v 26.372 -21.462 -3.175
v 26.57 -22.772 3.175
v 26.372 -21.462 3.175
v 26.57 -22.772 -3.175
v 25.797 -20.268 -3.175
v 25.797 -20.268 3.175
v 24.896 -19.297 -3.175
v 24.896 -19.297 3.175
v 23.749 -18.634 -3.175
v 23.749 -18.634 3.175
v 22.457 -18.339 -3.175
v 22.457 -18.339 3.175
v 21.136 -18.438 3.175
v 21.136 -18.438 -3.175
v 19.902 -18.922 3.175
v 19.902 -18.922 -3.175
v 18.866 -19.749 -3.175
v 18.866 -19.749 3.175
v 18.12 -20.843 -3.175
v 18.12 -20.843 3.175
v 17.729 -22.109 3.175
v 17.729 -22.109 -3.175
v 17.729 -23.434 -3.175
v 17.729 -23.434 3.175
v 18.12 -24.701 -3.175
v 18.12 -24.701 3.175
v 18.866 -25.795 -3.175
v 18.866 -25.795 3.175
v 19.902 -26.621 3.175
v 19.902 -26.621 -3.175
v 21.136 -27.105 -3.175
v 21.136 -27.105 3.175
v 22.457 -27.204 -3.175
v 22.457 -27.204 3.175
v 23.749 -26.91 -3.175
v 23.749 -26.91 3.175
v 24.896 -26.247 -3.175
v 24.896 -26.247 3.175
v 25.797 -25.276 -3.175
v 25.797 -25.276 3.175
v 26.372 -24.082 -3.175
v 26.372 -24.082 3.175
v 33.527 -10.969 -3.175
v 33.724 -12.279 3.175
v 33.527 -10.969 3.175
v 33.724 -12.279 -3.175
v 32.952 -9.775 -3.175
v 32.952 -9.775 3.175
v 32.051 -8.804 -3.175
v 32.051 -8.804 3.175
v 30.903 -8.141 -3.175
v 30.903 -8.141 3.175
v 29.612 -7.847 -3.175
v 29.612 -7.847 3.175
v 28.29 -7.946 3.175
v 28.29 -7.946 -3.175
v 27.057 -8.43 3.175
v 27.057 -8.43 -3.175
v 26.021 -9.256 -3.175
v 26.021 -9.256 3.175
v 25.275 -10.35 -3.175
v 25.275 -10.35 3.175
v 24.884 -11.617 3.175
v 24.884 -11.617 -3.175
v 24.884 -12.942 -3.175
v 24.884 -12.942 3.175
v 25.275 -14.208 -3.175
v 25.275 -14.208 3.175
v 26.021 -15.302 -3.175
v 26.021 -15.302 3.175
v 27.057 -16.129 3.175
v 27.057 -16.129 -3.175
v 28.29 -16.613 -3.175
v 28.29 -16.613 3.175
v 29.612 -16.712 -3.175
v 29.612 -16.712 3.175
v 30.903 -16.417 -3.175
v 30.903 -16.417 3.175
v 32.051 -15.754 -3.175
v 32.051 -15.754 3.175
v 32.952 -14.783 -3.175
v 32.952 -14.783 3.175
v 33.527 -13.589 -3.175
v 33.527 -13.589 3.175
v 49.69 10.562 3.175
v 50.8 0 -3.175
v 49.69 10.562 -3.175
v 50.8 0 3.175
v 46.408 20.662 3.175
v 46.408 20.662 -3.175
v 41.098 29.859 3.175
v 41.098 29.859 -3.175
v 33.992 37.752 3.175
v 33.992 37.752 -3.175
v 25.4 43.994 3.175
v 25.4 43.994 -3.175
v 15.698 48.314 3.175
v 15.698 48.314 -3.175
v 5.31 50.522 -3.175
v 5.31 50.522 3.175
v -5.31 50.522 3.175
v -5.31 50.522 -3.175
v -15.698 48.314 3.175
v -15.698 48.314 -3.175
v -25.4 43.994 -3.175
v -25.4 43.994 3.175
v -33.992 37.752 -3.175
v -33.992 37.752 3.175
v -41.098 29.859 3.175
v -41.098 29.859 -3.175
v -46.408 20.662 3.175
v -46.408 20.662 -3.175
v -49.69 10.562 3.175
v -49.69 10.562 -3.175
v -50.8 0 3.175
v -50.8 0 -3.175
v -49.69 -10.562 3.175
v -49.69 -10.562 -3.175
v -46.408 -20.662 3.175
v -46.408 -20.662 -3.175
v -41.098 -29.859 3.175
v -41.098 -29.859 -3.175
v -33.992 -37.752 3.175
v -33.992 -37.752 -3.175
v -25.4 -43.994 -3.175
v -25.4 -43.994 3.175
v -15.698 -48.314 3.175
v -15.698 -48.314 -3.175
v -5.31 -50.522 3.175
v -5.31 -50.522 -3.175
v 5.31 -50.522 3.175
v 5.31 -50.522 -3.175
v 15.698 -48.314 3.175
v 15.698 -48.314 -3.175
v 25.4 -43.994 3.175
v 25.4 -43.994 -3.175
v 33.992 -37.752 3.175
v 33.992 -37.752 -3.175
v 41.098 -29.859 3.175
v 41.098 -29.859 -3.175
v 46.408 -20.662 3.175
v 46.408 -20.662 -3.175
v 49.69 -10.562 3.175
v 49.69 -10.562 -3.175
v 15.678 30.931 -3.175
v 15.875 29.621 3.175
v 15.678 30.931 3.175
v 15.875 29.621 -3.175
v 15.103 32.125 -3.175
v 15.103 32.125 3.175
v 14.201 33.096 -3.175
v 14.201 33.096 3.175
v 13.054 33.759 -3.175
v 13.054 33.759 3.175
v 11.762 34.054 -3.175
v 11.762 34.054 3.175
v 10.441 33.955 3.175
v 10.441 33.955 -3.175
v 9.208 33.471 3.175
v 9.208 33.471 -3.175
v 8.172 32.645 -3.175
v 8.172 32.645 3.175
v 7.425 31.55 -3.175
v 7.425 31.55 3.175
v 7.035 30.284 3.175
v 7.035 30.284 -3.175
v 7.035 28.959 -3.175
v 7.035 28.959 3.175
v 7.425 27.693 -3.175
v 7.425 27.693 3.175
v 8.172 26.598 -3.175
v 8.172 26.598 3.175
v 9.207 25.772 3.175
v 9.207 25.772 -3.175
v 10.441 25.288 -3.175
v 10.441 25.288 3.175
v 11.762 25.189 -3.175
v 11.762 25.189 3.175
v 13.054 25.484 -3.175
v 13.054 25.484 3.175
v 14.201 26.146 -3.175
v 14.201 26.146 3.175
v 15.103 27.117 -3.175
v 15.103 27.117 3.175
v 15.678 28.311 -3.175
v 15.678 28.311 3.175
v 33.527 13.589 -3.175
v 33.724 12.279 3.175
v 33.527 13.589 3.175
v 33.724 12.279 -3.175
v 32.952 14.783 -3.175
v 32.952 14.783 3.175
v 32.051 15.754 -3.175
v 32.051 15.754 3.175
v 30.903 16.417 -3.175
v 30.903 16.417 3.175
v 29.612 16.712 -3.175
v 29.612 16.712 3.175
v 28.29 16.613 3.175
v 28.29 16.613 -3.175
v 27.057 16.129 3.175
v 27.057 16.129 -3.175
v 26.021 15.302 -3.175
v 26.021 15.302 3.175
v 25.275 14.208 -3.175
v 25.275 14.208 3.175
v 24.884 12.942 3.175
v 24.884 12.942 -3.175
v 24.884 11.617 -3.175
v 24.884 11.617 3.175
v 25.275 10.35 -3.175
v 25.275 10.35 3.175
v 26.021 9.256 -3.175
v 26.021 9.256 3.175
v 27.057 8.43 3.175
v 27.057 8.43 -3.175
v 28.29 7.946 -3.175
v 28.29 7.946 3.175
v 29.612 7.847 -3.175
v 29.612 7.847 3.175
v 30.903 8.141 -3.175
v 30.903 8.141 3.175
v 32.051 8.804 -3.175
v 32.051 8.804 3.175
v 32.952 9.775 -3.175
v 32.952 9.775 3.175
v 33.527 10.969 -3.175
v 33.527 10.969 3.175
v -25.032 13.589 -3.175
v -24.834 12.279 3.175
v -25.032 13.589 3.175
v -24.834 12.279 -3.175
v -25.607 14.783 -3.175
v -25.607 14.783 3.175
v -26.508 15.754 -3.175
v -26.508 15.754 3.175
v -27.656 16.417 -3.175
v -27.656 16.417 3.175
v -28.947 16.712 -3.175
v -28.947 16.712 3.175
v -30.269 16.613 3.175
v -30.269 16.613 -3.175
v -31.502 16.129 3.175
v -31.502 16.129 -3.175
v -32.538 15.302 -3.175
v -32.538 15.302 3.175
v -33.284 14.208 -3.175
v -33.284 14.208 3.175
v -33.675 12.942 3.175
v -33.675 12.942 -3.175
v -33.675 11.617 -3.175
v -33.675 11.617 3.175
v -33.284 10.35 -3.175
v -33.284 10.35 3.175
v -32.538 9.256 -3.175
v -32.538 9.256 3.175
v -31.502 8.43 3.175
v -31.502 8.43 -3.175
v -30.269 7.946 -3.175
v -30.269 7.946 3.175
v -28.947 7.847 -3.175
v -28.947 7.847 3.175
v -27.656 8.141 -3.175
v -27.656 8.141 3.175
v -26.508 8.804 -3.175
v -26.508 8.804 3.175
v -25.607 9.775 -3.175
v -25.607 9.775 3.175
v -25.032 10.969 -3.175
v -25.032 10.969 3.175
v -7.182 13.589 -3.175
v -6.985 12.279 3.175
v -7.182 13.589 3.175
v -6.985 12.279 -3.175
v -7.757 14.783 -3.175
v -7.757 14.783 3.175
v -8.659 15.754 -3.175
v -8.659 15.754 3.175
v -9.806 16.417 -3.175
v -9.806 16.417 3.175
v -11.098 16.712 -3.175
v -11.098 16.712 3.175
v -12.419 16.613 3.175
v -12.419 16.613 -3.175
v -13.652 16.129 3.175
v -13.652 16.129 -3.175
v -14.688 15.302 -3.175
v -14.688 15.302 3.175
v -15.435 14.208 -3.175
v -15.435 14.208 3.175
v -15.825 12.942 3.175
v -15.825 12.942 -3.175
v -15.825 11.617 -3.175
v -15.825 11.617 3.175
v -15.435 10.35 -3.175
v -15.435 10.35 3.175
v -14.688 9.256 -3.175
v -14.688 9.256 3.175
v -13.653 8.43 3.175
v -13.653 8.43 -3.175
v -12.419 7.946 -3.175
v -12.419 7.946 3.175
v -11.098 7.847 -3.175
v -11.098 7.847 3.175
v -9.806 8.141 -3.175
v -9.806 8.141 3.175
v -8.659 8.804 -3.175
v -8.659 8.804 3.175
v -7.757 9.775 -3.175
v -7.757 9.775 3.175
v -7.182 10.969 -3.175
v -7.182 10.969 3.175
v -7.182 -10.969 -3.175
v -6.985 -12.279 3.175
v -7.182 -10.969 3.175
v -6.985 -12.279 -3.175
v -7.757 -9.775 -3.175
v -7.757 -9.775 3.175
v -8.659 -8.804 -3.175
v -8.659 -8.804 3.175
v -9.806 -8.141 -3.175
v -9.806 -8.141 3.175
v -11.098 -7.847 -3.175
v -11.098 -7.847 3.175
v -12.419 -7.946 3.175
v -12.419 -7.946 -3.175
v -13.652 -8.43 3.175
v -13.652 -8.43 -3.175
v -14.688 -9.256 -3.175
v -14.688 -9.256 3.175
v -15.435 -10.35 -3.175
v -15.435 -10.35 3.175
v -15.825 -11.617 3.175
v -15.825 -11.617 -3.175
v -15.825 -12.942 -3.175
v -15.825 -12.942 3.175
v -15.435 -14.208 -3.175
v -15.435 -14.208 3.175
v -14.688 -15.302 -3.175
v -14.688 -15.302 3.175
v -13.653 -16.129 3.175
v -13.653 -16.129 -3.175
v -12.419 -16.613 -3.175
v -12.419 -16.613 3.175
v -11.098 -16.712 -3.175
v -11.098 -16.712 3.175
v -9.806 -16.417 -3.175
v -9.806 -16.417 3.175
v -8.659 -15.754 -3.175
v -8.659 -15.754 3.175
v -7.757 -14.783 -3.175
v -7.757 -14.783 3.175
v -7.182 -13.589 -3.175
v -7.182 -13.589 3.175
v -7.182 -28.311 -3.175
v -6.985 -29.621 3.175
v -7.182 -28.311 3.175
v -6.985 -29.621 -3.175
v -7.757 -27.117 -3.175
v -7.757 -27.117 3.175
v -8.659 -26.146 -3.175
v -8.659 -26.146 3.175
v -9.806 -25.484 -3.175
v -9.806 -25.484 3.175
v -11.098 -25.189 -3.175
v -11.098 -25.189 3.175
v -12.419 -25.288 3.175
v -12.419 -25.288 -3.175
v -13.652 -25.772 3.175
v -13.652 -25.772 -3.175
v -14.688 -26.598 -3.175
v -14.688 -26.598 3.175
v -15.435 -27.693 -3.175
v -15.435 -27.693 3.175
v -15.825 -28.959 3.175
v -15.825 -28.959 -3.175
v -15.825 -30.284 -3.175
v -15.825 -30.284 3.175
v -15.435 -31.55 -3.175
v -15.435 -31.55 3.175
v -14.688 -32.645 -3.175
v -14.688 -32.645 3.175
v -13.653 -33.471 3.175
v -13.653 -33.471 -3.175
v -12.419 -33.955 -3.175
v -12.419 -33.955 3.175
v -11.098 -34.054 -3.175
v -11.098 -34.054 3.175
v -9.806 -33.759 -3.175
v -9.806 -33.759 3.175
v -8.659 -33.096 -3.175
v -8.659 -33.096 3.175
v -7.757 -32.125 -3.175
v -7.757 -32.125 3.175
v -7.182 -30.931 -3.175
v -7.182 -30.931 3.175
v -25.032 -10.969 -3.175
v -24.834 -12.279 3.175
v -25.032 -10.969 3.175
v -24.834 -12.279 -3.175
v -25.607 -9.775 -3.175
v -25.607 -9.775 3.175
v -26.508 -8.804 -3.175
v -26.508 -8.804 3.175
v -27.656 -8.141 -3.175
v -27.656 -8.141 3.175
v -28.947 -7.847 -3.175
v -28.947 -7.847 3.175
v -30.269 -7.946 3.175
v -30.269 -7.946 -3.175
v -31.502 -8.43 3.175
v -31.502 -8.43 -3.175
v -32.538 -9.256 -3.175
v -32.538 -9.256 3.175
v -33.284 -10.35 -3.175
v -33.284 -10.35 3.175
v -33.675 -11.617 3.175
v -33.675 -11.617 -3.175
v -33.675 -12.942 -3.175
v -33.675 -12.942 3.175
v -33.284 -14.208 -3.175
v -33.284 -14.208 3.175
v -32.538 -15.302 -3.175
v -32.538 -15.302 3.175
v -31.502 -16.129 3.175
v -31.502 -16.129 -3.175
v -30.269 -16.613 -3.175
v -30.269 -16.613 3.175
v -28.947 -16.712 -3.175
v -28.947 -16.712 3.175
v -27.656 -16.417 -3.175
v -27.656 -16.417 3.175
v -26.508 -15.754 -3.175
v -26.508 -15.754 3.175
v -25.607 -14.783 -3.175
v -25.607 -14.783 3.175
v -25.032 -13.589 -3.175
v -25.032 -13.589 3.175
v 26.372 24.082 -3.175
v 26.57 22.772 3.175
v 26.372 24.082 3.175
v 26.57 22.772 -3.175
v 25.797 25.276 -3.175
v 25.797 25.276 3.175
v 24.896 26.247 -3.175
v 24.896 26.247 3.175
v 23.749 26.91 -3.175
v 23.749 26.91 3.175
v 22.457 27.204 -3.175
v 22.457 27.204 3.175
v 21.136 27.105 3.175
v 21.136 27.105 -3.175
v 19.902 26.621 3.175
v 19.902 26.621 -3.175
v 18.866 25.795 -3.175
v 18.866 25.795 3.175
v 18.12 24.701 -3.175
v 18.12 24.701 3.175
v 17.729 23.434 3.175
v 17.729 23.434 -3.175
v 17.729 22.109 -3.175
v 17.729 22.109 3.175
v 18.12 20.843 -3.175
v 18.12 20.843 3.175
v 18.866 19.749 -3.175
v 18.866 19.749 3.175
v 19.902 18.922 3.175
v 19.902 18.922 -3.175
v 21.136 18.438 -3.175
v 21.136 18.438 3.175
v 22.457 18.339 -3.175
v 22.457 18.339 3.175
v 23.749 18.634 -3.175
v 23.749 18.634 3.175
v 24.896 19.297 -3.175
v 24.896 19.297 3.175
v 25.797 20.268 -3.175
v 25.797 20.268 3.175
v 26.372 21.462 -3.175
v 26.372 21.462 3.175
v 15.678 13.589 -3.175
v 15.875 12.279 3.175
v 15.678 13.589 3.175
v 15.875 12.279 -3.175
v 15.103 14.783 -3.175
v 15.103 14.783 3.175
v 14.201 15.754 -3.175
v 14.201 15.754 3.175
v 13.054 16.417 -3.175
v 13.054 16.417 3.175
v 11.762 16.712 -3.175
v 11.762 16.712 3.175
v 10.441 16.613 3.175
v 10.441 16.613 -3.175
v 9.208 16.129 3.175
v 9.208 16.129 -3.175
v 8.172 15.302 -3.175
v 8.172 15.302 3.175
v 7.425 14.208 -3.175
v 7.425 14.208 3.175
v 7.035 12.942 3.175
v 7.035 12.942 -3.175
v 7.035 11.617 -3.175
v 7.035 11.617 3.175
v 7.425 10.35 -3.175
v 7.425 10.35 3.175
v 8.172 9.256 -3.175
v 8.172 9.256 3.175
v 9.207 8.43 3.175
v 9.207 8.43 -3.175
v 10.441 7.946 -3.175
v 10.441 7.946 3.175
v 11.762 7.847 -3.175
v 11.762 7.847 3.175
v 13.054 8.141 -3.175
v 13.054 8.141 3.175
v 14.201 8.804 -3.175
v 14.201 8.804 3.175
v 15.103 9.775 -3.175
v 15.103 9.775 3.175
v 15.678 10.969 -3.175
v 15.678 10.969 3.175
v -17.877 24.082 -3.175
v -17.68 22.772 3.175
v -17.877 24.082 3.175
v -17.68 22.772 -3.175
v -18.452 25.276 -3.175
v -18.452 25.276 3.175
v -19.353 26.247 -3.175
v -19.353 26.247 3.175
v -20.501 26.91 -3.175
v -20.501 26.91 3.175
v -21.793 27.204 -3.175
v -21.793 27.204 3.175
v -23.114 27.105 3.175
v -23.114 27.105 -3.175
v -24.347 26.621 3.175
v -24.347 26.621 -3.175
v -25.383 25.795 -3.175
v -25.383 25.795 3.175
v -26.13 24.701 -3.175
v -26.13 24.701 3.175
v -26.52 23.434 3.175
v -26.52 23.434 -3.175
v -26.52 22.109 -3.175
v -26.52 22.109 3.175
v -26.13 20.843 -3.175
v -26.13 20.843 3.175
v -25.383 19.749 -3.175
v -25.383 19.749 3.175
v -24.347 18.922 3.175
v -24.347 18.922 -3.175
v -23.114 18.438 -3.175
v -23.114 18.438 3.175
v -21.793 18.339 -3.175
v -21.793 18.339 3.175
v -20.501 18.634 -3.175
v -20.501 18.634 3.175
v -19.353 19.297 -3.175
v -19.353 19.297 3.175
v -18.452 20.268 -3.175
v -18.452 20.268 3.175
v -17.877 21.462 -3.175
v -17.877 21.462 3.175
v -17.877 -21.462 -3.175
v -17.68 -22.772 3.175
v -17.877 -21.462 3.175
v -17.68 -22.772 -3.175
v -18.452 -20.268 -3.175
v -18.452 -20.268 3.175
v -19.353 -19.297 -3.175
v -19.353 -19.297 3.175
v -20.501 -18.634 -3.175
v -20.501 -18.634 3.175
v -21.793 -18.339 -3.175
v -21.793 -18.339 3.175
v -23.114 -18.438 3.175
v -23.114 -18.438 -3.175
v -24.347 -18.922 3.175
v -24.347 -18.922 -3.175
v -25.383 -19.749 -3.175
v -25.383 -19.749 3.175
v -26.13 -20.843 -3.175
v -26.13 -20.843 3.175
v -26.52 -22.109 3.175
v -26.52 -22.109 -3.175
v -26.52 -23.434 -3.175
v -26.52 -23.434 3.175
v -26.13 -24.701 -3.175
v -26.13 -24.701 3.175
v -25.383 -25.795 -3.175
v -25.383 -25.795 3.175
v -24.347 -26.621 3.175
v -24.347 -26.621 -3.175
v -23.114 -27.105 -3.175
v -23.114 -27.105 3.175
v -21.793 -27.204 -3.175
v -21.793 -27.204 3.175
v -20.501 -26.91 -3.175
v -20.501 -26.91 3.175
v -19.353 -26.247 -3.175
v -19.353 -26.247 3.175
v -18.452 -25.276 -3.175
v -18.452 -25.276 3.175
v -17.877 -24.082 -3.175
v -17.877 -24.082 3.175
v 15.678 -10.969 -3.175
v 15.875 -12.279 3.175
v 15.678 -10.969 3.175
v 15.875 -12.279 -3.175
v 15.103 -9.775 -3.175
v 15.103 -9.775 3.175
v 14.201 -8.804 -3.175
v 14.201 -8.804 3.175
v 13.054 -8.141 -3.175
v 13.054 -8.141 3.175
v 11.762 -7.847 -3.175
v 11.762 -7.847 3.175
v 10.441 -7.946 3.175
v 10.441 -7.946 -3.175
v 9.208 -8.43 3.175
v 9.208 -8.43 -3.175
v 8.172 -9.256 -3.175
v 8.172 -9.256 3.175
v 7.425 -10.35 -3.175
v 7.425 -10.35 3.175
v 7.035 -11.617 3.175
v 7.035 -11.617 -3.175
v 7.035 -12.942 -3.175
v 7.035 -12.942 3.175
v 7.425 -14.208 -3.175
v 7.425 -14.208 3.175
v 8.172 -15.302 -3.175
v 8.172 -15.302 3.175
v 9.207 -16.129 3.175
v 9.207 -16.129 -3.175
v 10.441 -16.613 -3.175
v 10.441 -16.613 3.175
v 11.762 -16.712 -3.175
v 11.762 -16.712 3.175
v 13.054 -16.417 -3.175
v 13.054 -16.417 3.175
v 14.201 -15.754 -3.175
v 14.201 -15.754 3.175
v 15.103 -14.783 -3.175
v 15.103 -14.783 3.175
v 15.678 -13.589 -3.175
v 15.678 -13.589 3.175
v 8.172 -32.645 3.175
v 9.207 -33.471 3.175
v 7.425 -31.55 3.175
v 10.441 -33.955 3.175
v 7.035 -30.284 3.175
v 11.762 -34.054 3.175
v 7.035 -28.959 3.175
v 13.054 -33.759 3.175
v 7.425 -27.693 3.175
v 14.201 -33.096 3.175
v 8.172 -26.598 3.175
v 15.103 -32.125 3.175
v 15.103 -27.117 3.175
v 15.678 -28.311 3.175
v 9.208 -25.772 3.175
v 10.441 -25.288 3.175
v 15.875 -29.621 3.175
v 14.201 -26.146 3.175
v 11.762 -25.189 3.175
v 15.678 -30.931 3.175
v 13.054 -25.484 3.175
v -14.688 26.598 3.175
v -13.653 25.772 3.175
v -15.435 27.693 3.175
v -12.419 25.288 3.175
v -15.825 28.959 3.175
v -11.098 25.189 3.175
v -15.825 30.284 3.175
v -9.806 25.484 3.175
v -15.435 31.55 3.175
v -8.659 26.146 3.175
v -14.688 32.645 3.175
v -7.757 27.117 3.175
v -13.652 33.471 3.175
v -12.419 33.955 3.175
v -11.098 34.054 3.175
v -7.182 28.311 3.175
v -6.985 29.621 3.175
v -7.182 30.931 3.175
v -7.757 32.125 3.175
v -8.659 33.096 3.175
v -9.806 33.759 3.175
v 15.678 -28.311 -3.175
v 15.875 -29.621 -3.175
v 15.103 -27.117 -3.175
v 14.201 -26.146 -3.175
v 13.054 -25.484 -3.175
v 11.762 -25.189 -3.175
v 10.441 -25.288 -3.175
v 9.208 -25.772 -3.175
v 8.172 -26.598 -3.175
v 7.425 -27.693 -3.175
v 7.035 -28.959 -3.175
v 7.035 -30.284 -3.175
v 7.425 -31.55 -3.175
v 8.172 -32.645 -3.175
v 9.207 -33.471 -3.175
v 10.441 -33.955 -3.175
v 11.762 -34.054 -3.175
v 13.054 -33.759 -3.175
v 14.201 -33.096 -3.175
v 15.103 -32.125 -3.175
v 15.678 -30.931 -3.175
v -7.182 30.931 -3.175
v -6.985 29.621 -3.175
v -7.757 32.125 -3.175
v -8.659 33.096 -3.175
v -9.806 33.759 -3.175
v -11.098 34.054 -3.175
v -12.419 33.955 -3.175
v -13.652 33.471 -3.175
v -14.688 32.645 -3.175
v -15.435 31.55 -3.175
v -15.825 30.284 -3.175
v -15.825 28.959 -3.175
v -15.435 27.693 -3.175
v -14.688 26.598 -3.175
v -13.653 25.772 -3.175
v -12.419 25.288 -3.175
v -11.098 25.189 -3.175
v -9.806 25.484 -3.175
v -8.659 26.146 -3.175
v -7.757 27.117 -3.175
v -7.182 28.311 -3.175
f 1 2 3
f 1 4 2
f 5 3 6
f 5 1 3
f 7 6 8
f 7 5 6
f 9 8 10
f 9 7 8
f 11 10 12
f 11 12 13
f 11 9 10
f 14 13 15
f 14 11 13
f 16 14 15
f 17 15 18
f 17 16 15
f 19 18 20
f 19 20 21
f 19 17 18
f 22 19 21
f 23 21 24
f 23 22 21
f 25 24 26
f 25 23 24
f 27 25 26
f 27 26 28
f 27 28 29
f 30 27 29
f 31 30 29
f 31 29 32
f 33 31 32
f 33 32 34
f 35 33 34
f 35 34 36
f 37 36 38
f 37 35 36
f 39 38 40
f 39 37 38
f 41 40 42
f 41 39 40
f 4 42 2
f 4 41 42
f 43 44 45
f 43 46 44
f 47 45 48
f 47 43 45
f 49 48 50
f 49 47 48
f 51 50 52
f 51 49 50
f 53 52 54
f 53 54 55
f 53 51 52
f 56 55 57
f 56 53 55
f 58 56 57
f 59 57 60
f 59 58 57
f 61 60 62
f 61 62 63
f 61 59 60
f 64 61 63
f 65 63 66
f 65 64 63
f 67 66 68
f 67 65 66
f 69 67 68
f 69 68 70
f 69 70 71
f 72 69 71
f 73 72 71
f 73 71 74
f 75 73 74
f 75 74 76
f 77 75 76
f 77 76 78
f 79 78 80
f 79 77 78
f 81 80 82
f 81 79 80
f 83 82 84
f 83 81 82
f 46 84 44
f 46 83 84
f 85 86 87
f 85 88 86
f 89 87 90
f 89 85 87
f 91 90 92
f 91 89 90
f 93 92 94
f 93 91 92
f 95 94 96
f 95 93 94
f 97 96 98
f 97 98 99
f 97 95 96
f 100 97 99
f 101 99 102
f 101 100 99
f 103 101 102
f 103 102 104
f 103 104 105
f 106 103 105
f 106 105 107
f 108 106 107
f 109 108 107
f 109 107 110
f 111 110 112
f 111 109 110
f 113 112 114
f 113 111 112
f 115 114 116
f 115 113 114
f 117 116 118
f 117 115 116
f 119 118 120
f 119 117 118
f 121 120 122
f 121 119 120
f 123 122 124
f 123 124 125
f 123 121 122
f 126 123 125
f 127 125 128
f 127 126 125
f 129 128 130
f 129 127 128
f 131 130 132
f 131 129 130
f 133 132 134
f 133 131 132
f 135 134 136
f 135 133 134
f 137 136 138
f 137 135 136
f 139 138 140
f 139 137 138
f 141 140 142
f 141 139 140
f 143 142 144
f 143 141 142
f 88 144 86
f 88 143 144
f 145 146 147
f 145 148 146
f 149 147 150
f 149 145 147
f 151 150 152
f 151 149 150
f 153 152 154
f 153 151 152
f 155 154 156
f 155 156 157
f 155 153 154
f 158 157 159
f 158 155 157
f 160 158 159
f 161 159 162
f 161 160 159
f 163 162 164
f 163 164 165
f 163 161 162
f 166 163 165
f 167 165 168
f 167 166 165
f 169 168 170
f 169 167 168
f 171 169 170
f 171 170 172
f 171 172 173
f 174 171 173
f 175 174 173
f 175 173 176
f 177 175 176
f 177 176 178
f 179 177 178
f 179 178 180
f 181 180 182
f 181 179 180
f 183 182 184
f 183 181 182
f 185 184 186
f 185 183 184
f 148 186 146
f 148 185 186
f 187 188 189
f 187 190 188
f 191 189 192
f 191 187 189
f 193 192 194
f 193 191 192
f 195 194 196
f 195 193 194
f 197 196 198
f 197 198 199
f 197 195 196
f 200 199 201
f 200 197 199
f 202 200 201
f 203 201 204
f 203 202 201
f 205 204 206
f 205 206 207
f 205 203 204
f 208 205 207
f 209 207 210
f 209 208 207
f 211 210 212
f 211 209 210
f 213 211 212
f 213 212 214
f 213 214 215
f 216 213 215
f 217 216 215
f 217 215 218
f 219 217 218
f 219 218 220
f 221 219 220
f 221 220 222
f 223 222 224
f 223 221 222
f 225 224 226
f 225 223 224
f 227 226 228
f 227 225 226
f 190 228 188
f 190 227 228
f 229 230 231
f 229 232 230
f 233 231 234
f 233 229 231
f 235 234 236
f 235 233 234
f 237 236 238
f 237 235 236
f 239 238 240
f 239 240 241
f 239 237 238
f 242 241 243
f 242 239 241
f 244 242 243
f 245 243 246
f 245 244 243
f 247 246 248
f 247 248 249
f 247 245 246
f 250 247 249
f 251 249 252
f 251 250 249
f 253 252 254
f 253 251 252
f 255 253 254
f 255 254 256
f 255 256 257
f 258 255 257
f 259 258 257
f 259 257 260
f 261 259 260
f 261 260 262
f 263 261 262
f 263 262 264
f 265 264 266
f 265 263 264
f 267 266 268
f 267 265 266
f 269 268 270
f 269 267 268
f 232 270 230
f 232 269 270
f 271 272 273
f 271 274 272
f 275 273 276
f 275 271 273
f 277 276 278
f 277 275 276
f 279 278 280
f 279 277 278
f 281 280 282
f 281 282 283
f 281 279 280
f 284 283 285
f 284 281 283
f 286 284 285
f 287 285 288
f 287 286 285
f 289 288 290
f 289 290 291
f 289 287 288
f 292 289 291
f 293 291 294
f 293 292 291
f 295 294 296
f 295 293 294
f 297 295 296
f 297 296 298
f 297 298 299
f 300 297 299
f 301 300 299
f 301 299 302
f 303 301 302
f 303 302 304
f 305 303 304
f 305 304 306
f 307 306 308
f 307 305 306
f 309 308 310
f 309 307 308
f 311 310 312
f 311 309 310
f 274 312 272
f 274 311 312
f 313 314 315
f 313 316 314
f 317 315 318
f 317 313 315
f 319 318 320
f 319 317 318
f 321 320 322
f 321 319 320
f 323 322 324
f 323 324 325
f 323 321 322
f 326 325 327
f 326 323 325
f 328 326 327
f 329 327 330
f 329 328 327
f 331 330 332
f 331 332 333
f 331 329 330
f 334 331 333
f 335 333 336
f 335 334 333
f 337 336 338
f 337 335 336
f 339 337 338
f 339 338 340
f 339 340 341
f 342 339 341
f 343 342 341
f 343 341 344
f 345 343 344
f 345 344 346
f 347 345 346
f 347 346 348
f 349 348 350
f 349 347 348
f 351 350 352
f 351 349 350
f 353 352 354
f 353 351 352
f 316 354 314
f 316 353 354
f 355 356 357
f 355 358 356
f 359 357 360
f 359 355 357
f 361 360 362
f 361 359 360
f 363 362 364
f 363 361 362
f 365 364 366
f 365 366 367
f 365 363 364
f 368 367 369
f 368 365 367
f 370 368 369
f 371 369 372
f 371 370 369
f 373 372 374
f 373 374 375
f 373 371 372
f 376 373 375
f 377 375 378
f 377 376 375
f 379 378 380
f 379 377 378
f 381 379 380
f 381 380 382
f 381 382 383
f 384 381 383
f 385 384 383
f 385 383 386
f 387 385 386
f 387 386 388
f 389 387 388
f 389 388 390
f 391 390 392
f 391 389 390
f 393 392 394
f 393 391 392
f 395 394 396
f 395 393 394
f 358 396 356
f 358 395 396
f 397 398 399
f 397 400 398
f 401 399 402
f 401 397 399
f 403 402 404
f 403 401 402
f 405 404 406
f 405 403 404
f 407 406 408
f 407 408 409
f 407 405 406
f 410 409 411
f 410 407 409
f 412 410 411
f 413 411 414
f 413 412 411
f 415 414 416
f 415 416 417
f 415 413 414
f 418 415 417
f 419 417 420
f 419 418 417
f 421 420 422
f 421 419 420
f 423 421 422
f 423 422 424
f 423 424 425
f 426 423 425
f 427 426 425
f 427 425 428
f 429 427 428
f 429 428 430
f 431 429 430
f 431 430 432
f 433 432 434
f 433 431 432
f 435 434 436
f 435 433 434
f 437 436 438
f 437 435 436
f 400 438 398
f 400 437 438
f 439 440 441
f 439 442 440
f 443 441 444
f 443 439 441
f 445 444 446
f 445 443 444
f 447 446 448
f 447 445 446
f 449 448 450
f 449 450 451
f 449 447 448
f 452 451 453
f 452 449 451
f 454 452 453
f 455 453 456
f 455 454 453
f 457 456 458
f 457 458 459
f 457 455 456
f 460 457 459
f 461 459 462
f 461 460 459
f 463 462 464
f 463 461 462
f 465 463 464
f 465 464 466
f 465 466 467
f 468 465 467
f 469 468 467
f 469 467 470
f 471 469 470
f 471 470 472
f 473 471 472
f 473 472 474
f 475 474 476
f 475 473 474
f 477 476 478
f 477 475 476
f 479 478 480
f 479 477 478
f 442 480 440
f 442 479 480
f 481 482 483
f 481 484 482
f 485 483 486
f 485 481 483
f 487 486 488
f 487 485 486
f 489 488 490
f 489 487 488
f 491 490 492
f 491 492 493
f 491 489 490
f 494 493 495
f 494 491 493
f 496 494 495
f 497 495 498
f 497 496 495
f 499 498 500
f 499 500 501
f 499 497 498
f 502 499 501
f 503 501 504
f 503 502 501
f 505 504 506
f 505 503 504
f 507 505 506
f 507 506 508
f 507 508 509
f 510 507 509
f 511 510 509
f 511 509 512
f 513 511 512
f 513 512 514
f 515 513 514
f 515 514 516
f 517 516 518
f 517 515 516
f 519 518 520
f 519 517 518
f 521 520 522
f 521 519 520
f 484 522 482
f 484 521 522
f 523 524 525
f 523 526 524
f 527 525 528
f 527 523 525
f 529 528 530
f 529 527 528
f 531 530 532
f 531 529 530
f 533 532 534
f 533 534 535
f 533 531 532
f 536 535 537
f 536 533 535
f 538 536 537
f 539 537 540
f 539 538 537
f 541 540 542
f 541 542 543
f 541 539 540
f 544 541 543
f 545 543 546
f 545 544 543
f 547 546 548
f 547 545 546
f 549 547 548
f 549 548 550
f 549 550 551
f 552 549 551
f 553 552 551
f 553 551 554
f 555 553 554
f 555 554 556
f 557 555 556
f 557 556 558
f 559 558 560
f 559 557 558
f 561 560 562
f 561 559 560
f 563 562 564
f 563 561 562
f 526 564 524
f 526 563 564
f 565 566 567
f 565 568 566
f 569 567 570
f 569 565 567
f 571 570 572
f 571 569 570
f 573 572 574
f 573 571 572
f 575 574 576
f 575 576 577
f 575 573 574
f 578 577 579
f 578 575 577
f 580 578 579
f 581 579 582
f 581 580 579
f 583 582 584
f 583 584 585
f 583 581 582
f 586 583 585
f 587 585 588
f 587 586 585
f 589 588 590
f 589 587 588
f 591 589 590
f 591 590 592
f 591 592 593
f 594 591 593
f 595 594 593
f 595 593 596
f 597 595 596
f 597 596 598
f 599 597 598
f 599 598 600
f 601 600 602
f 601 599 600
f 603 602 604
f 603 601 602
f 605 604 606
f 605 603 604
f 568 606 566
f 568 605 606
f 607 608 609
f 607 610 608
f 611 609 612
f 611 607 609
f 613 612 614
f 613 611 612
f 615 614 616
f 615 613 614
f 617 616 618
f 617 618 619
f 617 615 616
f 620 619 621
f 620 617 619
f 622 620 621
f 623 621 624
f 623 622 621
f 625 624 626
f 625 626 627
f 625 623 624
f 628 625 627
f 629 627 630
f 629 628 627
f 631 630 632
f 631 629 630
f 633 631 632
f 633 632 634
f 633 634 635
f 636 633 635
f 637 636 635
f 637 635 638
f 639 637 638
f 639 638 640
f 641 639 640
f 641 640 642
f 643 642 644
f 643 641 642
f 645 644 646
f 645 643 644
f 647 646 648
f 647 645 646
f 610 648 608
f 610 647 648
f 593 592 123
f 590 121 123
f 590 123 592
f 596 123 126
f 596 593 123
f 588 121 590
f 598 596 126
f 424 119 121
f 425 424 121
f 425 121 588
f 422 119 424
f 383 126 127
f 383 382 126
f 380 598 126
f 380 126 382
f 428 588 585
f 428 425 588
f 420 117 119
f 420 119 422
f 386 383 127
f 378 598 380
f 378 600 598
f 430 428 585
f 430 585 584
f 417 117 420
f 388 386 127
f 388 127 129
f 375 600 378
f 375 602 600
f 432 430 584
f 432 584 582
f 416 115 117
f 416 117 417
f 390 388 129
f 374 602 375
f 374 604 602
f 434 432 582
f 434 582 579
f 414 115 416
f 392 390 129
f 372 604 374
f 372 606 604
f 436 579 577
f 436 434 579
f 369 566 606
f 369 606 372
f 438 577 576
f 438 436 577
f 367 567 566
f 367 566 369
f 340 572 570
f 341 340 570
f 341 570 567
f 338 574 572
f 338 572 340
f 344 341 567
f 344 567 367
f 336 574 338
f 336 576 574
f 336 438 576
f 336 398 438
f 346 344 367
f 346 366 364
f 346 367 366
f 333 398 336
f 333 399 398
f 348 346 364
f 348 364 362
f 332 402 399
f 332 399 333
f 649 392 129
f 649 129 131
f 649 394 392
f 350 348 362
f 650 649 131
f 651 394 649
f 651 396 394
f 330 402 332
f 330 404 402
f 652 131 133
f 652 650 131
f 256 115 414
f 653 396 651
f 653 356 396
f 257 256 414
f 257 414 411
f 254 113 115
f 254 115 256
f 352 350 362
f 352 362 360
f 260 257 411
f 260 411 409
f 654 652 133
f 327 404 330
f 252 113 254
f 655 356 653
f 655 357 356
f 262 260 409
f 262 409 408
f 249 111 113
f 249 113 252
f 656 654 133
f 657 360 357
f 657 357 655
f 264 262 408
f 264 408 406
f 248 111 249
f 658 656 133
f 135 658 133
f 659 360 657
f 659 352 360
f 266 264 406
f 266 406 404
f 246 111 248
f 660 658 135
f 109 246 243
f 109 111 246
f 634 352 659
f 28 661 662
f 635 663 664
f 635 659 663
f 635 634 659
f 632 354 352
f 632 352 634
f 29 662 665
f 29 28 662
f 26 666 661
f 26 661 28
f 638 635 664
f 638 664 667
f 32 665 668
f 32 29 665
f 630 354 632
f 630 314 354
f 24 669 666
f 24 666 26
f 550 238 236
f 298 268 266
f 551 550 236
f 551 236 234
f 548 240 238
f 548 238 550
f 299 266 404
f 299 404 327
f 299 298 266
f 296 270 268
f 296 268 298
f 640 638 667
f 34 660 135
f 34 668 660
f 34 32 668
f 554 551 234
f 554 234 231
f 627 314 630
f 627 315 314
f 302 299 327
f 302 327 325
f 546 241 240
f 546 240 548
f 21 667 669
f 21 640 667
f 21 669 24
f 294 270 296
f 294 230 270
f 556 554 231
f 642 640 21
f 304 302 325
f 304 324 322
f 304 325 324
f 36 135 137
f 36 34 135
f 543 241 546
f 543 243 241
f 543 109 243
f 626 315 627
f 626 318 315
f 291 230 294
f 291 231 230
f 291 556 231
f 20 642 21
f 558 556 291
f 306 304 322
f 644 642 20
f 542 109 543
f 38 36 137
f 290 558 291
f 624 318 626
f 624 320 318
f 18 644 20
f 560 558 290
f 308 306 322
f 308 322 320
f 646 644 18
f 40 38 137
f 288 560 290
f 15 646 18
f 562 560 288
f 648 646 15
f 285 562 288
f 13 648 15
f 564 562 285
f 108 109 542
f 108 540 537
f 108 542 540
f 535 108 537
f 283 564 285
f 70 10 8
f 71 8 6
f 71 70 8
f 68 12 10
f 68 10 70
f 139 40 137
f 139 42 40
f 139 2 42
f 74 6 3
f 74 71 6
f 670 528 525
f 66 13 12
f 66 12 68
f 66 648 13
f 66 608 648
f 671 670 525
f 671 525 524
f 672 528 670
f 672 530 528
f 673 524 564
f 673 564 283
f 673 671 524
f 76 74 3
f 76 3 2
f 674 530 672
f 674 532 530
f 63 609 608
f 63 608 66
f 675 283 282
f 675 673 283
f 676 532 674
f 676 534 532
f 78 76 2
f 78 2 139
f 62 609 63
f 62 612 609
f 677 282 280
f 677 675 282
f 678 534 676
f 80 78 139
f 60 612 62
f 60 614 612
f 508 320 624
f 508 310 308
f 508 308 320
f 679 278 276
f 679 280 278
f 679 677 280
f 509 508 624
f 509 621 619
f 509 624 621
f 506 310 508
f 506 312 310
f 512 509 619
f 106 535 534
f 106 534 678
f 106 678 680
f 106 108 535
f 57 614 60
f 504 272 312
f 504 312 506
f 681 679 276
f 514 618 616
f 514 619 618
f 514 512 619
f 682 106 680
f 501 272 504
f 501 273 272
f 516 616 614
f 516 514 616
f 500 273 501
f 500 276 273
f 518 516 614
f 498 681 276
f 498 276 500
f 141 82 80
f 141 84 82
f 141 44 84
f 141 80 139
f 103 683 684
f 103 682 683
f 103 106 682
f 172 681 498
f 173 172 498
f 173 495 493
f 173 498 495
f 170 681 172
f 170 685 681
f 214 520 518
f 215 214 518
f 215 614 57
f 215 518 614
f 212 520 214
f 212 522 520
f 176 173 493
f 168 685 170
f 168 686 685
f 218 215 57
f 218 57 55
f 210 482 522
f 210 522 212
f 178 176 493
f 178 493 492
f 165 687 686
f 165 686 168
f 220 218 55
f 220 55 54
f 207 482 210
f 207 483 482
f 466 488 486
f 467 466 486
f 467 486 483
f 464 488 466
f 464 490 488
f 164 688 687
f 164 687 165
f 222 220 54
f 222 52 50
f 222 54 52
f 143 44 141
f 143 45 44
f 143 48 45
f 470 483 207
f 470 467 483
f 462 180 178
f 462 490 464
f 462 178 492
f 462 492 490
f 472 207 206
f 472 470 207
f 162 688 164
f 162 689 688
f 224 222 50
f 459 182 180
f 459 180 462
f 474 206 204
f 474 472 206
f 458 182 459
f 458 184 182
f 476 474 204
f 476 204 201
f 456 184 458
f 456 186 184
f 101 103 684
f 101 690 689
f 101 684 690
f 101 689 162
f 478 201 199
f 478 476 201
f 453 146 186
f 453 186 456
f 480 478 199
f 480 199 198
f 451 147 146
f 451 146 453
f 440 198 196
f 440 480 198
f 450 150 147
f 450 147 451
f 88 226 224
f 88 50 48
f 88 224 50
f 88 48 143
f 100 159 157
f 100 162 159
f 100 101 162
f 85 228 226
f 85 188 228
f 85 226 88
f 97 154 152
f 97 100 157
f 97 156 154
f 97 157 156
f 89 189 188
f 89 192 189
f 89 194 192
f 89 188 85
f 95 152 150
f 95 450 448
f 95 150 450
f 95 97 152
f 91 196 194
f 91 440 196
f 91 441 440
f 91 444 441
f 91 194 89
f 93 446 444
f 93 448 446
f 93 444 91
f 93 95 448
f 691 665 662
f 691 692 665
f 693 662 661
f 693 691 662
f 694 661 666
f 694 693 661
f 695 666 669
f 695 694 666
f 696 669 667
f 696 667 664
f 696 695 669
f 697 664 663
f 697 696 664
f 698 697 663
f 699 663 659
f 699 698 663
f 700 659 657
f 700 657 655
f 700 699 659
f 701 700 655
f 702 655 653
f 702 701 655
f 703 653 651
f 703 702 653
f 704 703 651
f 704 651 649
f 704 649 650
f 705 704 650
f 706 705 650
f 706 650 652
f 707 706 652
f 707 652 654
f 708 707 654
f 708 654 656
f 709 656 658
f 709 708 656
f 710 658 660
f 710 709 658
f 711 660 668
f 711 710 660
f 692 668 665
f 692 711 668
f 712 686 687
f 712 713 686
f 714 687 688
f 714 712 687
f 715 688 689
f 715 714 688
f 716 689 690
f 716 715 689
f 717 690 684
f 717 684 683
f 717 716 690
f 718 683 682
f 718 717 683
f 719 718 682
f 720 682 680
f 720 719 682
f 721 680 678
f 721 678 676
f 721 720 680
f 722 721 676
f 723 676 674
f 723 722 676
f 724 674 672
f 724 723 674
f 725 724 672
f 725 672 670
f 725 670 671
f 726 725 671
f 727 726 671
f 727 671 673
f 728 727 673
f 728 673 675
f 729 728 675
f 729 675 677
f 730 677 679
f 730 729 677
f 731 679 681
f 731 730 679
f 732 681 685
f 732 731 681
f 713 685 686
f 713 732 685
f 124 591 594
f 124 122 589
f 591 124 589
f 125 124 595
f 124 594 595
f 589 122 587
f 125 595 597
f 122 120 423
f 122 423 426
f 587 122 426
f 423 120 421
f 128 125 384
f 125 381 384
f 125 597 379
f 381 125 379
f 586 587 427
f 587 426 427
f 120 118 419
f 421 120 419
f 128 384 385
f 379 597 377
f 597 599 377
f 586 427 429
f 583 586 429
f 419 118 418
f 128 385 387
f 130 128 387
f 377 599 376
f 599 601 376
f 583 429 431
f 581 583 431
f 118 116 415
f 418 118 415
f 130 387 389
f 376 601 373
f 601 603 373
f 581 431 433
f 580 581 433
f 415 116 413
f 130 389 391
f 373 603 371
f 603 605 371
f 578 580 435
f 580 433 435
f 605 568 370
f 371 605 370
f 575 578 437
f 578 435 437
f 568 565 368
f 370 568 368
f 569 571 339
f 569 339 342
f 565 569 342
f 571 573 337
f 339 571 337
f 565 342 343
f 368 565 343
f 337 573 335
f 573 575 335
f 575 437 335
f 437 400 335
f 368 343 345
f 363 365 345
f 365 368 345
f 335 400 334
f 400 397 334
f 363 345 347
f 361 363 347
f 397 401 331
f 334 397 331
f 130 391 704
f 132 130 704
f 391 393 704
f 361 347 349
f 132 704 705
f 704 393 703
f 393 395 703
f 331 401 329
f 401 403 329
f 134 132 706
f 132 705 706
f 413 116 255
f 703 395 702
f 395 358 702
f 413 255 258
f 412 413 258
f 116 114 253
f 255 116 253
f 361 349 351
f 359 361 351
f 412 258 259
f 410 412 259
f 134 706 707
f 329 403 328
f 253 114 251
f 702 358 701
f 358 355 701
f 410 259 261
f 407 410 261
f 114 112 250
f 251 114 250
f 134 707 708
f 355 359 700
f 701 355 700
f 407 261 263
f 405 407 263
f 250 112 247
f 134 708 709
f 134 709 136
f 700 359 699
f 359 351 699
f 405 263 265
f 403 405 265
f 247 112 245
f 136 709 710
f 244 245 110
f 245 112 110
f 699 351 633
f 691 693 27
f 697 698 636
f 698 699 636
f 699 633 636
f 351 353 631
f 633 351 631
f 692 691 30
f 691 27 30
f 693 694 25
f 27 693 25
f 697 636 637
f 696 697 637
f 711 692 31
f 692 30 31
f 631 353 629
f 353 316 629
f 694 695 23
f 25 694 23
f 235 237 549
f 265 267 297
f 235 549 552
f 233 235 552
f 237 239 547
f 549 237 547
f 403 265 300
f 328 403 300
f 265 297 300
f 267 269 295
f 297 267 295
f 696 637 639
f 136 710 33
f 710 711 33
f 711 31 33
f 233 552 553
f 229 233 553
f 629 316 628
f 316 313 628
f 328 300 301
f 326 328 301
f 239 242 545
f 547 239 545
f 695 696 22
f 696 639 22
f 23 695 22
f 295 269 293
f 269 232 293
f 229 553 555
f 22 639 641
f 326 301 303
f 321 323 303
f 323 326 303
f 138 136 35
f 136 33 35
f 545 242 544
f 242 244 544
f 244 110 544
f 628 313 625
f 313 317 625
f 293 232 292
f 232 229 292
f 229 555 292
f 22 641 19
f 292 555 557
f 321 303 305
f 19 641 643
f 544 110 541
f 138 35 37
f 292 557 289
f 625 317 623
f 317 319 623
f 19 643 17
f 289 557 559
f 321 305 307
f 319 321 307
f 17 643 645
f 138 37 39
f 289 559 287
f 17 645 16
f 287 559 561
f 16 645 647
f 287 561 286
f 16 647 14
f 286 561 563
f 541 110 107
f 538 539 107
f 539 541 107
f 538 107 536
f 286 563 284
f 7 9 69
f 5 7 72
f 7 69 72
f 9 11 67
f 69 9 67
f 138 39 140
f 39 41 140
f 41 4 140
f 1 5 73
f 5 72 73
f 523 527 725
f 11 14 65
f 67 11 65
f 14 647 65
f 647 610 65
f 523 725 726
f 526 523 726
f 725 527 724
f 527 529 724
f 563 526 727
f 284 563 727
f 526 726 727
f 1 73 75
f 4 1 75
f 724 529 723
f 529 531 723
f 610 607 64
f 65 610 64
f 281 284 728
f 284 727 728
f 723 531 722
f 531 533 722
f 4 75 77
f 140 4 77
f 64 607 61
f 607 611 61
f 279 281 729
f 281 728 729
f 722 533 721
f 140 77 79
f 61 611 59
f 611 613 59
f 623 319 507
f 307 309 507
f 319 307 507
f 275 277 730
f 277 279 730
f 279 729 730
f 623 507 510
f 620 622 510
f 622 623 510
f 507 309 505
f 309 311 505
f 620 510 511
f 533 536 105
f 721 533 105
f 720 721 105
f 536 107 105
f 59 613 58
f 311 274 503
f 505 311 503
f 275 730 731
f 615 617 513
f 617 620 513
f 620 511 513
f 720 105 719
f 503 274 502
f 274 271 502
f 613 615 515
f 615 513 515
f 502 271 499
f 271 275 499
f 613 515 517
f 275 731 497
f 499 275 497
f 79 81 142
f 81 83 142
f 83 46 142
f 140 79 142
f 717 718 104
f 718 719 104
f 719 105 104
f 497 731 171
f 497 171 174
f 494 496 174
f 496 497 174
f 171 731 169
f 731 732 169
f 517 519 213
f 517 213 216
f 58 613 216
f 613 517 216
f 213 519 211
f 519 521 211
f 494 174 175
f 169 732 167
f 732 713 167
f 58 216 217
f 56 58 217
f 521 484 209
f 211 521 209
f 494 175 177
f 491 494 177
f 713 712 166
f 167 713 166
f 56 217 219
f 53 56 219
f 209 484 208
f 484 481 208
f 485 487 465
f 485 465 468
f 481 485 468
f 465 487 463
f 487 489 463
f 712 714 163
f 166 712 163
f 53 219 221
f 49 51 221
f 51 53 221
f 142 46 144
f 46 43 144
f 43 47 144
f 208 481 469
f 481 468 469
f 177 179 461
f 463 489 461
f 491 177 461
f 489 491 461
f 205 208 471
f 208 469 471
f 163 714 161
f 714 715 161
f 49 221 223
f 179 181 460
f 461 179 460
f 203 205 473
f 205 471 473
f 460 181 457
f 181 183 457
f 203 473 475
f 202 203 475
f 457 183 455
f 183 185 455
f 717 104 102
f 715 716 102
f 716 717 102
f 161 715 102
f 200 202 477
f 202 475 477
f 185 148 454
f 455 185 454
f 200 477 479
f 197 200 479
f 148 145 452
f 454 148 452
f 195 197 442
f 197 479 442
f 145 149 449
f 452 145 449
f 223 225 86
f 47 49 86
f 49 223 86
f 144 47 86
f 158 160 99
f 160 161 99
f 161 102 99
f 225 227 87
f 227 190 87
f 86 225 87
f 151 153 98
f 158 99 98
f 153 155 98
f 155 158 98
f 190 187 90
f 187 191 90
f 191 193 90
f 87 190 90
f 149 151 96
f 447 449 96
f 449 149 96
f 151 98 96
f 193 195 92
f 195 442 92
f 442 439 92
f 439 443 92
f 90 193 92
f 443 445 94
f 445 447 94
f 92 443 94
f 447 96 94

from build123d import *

# Parameters (mm, degrees)
F0_R     = 50.8
F0_R_2   = 4.445
F1_DEPTH = 3.175


with BuildPart() as f1:
    # F0 (on Top) → F1 (new body, symmetric)
    with BuildSketch(Plane.XY):
        Circle(F0_R)
        with Locations((-11.43, -29.621236)):
            Circle(F0_R_2, mode=Mode.SUBTRACT)
        with Locations((-29.279459, -12.279079)):
            Circle(F0_R_2, mode=Mode.SUBTRACT)
        with Locations((-22.124706, -22.77191)):
            Circle(F0_R_2, mode=Mode.SUBTRACT)
        with Locations((-11.43, -12.279079)):
            Circle(F0_R_2, mode=Mode.SUBTRACT)
        with Locations((11.43, -29.621236)):
            Circle(F0_R_2, mode=Mode.SUBTRACT)
        with Locations((22.124706, -22.77191)):
            Circle(F0_R_2, mode=Mode.SUBTRACT)
        with Locations((11.43, -12.279079)):
            Circle(F0_R_2, mode=Mode.SUBTRACT)
        with Locations((29.279459, -12.279079)):
            Circle(F0_R_2, mode=Mode.SUBTRACT)
        with Locations((-29.279459, 12.279079)):
            Circle(F0_R_2, mode=Mode.SUBTRACT)
        with Locations((-11.43, 12.279079)):
            Circle(F0_R_2, mode=Mode.SUBTRACT)
        with Locations((-22.124706, 22.77191)):
            Circle(F0_R_2, mode=Mode.SUBTRACT)
        with Locations((-11.43, 29.621236)):
            Circle(F0_R_2, mode=Mode.SUBTRACT)
        with Locations((11.43, 12.279079)):
            Circle(F0_R_2, mode=Mode.SUBTRACT)
        with Locations((22.124706, 22.77191)):
            Circle(F0_R_2, mode=Mode.SUBTRACT)
        with Locations((29.279459, 12.279079)):
            Circle(F0_R_2, mode=Mode.SUBTRACT)
        with Locations((11.43, 29.621236)):
            Circle(F0_R_2, mode=Mode.SUBTRACT)
    extrude(amount=F1_DEPTH, both=True)


solid = f1.part
